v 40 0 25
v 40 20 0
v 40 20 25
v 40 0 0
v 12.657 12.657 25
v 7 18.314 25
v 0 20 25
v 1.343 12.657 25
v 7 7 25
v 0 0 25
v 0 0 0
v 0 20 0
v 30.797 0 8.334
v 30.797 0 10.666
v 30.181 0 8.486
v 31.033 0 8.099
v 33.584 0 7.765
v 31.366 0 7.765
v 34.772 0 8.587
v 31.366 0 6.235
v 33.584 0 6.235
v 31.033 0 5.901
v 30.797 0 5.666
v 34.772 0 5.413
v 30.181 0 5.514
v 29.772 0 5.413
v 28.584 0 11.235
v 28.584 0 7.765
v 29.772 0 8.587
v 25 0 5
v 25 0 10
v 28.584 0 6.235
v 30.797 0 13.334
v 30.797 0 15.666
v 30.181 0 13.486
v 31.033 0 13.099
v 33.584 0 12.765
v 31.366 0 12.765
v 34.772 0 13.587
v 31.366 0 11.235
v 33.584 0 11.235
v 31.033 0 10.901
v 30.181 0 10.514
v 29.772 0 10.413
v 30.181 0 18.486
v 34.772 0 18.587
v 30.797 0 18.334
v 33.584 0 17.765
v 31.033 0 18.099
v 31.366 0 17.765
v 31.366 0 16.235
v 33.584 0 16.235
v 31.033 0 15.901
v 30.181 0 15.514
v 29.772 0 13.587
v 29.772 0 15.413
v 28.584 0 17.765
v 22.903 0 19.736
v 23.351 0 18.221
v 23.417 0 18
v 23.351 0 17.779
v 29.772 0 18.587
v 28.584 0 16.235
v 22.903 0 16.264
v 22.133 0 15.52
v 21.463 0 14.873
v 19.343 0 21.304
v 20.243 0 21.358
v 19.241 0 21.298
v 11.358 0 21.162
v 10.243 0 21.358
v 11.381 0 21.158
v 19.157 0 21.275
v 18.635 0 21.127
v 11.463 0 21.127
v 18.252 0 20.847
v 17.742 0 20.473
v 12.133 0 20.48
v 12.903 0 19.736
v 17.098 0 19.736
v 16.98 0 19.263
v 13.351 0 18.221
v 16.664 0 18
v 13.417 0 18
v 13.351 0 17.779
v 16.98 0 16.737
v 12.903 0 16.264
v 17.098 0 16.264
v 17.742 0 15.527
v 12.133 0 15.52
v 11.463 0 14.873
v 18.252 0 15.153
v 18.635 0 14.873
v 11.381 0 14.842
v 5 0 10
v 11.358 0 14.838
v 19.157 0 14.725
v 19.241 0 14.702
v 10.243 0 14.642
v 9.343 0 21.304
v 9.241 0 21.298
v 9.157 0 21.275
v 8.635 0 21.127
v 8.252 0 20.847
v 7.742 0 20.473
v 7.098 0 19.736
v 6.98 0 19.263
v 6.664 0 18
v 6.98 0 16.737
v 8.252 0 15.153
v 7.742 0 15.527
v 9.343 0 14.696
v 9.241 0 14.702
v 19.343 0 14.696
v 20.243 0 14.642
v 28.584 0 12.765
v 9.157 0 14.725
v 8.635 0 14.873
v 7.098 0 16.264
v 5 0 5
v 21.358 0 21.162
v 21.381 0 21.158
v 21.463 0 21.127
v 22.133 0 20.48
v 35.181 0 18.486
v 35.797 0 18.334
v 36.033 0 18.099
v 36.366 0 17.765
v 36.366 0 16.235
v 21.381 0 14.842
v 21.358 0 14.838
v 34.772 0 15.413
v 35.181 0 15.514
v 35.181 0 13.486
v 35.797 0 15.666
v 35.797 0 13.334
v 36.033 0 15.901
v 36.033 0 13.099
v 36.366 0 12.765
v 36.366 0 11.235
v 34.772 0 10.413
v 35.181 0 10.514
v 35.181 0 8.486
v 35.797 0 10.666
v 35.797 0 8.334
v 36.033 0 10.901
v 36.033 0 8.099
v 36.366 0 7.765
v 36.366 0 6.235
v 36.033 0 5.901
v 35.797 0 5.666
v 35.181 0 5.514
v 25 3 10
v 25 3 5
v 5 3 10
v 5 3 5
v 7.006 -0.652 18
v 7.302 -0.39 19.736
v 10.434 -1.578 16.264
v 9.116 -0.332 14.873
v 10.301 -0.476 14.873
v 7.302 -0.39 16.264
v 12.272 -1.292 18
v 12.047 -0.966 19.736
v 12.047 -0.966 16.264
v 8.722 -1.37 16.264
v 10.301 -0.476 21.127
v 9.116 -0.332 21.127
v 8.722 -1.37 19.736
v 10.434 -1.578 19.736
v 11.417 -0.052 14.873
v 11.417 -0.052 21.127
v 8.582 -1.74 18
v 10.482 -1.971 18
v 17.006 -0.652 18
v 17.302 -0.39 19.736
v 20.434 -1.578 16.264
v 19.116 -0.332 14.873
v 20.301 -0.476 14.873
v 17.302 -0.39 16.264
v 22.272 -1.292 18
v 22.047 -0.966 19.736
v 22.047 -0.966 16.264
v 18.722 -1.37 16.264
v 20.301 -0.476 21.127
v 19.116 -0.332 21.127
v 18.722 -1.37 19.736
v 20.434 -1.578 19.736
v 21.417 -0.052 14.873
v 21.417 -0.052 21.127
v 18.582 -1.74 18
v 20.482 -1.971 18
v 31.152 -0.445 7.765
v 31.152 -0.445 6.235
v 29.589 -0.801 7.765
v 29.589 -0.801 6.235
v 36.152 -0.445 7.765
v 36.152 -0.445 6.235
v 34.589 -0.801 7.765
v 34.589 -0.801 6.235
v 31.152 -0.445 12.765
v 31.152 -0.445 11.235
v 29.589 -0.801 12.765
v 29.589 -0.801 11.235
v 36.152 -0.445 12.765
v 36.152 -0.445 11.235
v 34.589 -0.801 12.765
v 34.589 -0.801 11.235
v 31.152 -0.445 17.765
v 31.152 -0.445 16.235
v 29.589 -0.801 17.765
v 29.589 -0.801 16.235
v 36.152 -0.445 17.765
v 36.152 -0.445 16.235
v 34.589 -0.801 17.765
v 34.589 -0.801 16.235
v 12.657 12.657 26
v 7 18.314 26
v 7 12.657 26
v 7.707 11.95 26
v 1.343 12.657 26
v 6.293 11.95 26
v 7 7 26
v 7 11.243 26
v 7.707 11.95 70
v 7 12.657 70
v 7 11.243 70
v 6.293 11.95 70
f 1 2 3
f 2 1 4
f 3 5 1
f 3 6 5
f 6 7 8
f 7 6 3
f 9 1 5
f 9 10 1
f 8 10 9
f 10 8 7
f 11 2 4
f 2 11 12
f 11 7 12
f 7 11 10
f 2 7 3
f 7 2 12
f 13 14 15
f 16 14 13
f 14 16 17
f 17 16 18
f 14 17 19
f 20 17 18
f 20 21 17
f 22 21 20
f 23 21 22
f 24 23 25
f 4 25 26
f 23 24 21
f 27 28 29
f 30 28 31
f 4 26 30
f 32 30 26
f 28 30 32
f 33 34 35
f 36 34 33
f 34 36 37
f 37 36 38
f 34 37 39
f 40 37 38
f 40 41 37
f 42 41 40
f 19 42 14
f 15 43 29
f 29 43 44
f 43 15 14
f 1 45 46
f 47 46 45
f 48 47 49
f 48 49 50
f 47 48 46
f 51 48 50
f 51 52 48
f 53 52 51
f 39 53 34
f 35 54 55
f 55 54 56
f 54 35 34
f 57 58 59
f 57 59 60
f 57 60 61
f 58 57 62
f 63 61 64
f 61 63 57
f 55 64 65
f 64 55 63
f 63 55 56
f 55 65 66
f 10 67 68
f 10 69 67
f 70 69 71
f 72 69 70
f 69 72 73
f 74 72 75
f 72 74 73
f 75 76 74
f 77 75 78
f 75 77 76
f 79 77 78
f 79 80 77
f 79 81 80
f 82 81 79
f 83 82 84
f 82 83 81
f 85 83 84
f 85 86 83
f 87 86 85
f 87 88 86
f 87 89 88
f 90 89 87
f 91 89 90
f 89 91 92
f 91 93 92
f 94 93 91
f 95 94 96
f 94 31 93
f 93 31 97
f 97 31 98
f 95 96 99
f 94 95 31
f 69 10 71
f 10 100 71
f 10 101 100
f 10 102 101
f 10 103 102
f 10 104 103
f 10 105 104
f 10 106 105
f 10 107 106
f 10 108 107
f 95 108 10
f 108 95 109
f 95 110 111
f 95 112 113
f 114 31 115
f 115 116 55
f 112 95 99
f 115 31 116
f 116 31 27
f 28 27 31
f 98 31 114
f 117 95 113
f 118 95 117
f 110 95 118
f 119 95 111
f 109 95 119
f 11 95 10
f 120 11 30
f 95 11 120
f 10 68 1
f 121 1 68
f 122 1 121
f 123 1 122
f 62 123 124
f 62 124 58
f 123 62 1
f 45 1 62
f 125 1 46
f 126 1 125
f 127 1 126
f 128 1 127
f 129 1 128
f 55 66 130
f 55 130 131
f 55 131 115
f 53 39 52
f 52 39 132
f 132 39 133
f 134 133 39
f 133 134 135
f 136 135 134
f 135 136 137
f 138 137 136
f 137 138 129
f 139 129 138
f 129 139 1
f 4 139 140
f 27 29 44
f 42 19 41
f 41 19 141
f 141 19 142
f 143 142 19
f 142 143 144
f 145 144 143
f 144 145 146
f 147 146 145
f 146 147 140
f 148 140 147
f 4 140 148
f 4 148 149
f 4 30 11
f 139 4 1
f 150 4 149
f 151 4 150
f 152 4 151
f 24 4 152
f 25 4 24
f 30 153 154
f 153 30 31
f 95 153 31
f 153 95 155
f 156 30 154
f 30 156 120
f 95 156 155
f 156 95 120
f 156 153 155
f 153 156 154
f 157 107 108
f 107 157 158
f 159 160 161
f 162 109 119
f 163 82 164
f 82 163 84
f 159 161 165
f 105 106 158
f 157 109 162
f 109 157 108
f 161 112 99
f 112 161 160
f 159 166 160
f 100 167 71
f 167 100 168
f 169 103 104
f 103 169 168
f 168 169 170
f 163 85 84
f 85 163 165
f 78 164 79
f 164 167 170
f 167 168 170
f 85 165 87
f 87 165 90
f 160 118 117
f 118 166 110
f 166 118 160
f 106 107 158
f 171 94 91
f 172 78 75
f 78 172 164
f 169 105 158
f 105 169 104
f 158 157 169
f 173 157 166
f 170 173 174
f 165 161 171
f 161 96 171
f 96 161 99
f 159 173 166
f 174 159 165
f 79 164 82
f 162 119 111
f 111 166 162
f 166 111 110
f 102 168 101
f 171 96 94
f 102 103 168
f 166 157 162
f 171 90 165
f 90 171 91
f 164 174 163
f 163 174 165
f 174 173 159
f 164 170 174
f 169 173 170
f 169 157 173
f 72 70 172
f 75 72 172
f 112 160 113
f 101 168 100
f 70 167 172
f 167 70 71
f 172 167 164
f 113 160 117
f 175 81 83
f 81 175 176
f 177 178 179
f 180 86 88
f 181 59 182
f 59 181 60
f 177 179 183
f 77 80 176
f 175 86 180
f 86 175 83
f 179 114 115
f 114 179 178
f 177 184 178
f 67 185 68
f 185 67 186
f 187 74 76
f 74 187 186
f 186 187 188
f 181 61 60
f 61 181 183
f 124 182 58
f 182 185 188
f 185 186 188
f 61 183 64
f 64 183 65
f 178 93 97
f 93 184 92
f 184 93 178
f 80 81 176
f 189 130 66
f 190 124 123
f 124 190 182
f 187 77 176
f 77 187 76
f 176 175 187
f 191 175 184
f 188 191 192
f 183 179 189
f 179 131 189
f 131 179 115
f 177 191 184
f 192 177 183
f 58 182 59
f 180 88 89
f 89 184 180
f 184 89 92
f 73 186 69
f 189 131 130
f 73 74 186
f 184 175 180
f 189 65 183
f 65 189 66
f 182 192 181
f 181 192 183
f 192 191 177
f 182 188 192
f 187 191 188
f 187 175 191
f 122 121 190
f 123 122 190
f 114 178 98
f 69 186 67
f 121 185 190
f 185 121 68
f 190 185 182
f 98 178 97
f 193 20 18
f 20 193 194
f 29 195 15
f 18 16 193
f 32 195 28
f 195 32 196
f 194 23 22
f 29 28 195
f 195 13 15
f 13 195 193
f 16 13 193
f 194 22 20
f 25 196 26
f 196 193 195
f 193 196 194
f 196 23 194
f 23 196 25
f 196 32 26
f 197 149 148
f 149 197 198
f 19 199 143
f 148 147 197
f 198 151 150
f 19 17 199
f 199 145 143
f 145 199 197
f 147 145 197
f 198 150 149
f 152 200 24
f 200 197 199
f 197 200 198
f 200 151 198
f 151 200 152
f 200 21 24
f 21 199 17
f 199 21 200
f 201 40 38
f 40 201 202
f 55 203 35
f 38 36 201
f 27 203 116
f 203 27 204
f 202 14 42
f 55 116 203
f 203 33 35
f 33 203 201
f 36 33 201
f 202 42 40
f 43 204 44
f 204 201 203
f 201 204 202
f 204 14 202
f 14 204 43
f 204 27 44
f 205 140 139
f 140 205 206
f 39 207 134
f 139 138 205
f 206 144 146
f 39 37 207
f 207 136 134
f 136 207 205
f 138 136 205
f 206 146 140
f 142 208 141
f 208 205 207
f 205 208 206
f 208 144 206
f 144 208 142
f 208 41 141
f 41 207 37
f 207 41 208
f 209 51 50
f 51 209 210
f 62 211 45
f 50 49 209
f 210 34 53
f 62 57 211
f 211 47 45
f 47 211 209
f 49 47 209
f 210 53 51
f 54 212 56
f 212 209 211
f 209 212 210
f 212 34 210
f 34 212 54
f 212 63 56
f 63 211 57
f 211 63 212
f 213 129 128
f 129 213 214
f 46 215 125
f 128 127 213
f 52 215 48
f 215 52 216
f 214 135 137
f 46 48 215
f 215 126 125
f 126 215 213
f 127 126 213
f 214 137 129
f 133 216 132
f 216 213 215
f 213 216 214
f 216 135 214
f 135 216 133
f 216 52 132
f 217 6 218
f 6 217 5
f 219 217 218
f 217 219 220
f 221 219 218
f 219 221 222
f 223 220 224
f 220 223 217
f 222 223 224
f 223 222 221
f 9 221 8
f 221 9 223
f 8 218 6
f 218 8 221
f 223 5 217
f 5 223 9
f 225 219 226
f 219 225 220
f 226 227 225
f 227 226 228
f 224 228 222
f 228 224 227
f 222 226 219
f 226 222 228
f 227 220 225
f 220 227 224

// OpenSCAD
union()
{
    difference(){
        cube([40, 20, 25]);
        translate([5,0,5]){
            cube([20,3,5]);
        }
    }
    
    for (i = [0:1]) {
        translate([i*10, 0, 0]) {
                translate([10, 2, 18])
                    sphere(r=4);
            }
        }
        for(i= [0:2]){
            for (j = [0:1]) {
                translate([20, 0, i*5])
                {
                        translate([10+5*j, 1, 7])
                        sphere(r=2);
                }
            }
        }
    translate([7,7,20])
        {
            rotate([0,0,45])
            {
                cube([8,8,6]);
                translate([3,3,0]){
                    cube([1,1,50]);
                    }
                }
            
            }
}
    
